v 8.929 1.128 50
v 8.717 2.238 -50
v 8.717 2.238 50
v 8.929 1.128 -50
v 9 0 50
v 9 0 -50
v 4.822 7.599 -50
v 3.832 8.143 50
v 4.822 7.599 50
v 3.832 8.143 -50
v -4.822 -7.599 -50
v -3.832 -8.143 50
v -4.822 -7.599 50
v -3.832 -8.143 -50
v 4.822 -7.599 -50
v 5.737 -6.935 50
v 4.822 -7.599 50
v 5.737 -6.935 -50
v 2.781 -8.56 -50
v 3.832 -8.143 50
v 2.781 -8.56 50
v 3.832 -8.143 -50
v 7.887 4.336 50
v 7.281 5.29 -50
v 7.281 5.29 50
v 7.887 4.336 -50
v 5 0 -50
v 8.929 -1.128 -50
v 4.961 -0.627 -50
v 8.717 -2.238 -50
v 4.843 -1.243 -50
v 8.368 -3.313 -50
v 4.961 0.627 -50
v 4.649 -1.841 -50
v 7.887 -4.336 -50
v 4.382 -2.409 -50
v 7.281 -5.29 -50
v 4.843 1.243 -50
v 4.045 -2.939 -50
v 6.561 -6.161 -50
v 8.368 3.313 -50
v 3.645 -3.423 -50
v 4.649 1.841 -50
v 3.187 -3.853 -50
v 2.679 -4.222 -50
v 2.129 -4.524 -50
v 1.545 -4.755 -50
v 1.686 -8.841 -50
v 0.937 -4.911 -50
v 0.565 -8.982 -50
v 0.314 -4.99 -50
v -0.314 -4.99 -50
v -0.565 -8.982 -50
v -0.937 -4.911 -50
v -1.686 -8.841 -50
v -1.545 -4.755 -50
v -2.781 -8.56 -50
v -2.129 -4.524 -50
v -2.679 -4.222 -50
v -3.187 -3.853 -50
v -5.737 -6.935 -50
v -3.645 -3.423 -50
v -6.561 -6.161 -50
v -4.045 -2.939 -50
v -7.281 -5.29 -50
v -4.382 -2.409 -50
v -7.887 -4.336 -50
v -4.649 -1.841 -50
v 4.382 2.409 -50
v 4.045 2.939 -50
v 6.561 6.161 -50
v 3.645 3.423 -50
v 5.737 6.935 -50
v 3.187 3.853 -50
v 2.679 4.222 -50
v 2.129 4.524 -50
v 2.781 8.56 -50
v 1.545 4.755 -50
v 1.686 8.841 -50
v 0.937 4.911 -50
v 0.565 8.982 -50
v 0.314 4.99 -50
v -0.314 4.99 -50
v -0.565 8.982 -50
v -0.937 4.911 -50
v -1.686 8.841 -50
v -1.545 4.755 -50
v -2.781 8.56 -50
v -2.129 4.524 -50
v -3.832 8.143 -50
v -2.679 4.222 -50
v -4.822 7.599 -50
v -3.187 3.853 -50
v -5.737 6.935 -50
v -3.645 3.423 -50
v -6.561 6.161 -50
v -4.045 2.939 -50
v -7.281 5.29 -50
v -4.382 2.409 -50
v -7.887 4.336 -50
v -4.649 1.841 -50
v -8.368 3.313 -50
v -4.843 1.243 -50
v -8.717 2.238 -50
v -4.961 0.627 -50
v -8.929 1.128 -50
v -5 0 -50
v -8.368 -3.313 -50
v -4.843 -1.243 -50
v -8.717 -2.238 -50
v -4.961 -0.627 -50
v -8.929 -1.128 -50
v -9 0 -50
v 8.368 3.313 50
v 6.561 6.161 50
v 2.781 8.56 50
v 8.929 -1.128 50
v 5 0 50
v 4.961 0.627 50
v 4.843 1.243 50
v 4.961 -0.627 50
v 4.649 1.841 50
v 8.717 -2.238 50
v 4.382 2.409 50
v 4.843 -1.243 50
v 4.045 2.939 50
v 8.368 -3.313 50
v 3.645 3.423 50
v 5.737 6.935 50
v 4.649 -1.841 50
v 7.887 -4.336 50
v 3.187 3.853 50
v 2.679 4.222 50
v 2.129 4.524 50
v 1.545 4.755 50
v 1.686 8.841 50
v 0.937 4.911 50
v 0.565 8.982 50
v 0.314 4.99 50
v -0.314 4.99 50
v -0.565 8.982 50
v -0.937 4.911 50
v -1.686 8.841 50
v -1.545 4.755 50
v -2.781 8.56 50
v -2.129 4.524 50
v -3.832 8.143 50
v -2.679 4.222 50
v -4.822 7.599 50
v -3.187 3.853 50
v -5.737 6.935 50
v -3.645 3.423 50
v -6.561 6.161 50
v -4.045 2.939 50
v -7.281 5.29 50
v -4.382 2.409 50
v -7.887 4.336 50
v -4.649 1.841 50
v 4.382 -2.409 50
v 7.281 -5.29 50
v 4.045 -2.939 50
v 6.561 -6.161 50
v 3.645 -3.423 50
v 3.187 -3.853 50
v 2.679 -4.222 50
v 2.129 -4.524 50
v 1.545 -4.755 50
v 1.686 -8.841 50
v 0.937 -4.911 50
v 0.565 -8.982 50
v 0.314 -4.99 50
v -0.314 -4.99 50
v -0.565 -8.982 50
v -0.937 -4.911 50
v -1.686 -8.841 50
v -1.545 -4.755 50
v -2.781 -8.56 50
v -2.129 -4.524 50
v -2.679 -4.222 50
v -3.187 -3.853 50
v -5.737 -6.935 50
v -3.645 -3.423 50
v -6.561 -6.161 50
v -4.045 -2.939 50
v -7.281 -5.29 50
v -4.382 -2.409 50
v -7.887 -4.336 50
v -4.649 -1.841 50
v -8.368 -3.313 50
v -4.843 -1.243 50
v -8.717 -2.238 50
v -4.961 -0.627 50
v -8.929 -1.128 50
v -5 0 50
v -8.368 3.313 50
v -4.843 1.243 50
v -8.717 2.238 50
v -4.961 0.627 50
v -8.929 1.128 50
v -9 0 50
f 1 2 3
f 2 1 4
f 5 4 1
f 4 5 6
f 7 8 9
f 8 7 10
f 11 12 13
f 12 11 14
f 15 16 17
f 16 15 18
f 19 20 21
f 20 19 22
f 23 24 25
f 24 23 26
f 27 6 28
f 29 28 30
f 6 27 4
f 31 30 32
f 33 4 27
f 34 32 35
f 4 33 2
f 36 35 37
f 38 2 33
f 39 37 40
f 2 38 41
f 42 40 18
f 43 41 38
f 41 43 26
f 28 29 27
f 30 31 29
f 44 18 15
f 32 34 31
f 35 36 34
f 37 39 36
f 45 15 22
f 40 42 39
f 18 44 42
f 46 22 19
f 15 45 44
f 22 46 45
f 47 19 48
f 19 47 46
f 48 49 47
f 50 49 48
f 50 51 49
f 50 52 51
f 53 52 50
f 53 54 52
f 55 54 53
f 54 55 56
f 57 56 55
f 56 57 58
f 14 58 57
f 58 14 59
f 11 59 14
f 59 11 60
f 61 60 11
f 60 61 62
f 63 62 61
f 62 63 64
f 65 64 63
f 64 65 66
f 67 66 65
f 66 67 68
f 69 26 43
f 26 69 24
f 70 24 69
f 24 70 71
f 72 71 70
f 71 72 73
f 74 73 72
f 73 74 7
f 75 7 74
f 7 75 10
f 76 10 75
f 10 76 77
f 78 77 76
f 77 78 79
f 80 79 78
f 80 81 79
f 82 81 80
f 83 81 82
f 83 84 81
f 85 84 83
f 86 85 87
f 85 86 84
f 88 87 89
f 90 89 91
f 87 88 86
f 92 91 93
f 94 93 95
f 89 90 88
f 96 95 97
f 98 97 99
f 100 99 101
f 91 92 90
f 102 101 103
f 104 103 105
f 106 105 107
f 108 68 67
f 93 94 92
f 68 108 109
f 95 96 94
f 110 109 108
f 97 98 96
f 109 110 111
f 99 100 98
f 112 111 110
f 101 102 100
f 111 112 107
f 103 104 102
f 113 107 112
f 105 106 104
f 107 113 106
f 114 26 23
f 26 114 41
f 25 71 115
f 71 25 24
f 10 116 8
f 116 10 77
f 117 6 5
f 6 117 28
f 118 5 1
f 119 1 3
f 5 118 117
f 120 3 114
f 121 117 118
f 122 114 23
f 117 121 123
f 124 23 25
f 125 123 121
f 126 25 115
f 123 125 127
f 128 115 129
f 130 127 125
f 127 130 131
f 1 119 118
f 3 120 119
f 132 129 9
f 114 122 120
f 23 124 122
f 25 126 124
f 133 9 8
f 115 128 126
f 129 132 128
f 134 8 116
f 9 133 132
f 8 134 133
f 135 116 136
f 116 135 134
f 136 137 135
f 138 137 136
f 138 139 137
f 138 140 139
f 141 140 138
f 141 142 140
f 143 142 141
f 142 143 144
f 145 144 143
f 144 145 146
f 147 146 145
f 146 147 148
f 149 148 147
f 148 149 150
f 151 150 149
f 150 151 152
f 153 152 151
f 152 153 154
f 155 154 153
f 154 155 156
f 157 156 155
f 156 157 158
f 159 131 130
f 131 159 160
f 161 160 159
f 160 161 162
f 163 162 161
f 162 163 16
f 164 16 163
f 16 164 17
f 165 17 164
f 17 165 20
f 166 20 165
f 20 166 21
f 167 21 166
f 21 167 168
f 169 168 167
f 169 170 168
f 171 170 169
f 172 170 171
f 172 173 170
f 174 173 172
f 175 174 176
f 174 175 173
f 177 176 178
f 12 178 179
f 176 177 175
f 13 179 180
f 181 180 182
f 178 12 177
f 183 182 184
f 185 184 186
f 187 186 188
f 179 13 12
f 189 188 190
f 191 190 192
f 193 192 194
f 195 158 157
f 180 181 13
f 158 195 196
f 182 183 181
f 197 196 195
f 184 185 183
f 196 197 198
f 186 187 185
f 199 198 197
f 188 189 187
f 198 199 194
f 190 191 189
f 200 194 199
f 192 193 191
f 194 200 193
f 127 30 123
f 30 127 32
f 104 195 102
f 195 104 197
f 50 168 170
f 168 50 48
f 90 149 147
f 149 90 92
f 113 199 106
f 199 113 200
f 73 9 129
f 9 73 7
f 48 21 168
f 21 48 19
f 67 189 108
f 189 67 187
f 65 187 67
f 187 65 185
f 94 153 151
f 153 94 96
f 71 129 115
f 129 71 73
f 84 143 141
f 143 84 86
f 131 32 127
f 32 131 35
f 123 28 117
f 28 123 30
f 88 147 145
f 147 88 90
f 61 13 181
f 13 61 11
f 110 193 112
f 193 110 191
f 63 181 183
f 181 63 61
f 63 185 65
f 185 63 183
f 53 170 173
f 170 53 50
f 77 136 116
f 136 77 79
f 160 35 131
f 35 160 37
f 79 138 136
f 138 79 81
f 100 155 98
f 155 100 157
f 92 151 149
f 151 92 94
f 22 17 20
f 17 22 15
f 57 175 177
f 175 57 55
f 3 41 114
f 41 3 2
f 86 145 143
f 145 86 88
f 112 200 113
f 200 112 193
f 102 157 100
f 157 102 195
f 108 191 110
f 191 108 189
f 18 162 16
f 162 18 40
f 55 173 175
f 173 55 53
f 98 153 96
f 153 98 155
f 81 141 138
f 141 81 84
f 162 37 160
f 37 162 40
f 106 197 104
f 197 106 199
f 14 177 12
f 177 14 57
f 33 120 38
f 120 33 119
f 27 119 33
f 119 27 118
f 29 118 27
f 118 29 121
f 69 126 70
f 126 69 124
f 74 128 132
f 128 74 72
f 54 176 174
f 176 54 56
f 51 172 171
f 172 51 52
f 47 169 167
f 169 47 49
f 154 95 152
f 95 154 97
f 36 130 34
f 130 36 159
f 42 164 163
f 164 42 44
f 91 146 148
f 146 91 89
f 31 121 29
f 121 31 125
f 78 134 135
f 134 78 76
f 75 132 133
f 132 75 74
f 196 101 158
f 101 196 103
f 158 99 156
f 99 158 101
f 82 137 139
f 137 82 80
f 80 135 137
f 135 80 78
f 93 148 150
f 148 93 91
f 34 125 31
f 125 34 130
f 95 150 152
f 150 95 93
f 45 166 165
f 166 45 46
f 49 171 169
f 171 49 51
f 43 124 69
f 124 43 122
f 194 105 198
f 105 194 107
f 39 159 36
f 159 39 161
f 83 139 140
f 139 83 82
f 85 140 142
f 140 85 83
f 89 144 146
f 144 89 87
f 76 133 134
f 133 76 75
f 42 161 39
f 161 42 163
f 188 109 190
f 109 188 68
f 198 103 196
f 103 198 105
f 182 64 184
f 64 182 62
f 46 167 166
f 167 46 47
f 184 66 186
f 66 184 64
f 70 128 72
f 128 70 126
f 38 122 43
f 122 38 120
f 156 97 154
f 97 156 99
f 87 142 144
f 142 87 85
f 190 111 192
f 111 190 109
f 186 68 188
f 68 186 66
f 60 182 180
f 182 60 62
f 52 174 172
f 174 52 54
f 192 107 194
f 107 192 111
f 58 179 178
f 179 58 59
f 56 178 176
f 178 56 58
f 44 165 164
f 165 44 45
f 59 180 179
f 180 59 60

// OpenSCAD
$fn = 50;


difference() {
	union() {
		translate(v = [0, 0, -50.0000000000]) {
			cylinder(h = 100, r = 9.0000000000);
		}
	}
	union() {
		translate(v = [0, 0, -100.0000000000]) {
			cylinder(h = 200, r = 5.0000000000);
		}
	}
}
